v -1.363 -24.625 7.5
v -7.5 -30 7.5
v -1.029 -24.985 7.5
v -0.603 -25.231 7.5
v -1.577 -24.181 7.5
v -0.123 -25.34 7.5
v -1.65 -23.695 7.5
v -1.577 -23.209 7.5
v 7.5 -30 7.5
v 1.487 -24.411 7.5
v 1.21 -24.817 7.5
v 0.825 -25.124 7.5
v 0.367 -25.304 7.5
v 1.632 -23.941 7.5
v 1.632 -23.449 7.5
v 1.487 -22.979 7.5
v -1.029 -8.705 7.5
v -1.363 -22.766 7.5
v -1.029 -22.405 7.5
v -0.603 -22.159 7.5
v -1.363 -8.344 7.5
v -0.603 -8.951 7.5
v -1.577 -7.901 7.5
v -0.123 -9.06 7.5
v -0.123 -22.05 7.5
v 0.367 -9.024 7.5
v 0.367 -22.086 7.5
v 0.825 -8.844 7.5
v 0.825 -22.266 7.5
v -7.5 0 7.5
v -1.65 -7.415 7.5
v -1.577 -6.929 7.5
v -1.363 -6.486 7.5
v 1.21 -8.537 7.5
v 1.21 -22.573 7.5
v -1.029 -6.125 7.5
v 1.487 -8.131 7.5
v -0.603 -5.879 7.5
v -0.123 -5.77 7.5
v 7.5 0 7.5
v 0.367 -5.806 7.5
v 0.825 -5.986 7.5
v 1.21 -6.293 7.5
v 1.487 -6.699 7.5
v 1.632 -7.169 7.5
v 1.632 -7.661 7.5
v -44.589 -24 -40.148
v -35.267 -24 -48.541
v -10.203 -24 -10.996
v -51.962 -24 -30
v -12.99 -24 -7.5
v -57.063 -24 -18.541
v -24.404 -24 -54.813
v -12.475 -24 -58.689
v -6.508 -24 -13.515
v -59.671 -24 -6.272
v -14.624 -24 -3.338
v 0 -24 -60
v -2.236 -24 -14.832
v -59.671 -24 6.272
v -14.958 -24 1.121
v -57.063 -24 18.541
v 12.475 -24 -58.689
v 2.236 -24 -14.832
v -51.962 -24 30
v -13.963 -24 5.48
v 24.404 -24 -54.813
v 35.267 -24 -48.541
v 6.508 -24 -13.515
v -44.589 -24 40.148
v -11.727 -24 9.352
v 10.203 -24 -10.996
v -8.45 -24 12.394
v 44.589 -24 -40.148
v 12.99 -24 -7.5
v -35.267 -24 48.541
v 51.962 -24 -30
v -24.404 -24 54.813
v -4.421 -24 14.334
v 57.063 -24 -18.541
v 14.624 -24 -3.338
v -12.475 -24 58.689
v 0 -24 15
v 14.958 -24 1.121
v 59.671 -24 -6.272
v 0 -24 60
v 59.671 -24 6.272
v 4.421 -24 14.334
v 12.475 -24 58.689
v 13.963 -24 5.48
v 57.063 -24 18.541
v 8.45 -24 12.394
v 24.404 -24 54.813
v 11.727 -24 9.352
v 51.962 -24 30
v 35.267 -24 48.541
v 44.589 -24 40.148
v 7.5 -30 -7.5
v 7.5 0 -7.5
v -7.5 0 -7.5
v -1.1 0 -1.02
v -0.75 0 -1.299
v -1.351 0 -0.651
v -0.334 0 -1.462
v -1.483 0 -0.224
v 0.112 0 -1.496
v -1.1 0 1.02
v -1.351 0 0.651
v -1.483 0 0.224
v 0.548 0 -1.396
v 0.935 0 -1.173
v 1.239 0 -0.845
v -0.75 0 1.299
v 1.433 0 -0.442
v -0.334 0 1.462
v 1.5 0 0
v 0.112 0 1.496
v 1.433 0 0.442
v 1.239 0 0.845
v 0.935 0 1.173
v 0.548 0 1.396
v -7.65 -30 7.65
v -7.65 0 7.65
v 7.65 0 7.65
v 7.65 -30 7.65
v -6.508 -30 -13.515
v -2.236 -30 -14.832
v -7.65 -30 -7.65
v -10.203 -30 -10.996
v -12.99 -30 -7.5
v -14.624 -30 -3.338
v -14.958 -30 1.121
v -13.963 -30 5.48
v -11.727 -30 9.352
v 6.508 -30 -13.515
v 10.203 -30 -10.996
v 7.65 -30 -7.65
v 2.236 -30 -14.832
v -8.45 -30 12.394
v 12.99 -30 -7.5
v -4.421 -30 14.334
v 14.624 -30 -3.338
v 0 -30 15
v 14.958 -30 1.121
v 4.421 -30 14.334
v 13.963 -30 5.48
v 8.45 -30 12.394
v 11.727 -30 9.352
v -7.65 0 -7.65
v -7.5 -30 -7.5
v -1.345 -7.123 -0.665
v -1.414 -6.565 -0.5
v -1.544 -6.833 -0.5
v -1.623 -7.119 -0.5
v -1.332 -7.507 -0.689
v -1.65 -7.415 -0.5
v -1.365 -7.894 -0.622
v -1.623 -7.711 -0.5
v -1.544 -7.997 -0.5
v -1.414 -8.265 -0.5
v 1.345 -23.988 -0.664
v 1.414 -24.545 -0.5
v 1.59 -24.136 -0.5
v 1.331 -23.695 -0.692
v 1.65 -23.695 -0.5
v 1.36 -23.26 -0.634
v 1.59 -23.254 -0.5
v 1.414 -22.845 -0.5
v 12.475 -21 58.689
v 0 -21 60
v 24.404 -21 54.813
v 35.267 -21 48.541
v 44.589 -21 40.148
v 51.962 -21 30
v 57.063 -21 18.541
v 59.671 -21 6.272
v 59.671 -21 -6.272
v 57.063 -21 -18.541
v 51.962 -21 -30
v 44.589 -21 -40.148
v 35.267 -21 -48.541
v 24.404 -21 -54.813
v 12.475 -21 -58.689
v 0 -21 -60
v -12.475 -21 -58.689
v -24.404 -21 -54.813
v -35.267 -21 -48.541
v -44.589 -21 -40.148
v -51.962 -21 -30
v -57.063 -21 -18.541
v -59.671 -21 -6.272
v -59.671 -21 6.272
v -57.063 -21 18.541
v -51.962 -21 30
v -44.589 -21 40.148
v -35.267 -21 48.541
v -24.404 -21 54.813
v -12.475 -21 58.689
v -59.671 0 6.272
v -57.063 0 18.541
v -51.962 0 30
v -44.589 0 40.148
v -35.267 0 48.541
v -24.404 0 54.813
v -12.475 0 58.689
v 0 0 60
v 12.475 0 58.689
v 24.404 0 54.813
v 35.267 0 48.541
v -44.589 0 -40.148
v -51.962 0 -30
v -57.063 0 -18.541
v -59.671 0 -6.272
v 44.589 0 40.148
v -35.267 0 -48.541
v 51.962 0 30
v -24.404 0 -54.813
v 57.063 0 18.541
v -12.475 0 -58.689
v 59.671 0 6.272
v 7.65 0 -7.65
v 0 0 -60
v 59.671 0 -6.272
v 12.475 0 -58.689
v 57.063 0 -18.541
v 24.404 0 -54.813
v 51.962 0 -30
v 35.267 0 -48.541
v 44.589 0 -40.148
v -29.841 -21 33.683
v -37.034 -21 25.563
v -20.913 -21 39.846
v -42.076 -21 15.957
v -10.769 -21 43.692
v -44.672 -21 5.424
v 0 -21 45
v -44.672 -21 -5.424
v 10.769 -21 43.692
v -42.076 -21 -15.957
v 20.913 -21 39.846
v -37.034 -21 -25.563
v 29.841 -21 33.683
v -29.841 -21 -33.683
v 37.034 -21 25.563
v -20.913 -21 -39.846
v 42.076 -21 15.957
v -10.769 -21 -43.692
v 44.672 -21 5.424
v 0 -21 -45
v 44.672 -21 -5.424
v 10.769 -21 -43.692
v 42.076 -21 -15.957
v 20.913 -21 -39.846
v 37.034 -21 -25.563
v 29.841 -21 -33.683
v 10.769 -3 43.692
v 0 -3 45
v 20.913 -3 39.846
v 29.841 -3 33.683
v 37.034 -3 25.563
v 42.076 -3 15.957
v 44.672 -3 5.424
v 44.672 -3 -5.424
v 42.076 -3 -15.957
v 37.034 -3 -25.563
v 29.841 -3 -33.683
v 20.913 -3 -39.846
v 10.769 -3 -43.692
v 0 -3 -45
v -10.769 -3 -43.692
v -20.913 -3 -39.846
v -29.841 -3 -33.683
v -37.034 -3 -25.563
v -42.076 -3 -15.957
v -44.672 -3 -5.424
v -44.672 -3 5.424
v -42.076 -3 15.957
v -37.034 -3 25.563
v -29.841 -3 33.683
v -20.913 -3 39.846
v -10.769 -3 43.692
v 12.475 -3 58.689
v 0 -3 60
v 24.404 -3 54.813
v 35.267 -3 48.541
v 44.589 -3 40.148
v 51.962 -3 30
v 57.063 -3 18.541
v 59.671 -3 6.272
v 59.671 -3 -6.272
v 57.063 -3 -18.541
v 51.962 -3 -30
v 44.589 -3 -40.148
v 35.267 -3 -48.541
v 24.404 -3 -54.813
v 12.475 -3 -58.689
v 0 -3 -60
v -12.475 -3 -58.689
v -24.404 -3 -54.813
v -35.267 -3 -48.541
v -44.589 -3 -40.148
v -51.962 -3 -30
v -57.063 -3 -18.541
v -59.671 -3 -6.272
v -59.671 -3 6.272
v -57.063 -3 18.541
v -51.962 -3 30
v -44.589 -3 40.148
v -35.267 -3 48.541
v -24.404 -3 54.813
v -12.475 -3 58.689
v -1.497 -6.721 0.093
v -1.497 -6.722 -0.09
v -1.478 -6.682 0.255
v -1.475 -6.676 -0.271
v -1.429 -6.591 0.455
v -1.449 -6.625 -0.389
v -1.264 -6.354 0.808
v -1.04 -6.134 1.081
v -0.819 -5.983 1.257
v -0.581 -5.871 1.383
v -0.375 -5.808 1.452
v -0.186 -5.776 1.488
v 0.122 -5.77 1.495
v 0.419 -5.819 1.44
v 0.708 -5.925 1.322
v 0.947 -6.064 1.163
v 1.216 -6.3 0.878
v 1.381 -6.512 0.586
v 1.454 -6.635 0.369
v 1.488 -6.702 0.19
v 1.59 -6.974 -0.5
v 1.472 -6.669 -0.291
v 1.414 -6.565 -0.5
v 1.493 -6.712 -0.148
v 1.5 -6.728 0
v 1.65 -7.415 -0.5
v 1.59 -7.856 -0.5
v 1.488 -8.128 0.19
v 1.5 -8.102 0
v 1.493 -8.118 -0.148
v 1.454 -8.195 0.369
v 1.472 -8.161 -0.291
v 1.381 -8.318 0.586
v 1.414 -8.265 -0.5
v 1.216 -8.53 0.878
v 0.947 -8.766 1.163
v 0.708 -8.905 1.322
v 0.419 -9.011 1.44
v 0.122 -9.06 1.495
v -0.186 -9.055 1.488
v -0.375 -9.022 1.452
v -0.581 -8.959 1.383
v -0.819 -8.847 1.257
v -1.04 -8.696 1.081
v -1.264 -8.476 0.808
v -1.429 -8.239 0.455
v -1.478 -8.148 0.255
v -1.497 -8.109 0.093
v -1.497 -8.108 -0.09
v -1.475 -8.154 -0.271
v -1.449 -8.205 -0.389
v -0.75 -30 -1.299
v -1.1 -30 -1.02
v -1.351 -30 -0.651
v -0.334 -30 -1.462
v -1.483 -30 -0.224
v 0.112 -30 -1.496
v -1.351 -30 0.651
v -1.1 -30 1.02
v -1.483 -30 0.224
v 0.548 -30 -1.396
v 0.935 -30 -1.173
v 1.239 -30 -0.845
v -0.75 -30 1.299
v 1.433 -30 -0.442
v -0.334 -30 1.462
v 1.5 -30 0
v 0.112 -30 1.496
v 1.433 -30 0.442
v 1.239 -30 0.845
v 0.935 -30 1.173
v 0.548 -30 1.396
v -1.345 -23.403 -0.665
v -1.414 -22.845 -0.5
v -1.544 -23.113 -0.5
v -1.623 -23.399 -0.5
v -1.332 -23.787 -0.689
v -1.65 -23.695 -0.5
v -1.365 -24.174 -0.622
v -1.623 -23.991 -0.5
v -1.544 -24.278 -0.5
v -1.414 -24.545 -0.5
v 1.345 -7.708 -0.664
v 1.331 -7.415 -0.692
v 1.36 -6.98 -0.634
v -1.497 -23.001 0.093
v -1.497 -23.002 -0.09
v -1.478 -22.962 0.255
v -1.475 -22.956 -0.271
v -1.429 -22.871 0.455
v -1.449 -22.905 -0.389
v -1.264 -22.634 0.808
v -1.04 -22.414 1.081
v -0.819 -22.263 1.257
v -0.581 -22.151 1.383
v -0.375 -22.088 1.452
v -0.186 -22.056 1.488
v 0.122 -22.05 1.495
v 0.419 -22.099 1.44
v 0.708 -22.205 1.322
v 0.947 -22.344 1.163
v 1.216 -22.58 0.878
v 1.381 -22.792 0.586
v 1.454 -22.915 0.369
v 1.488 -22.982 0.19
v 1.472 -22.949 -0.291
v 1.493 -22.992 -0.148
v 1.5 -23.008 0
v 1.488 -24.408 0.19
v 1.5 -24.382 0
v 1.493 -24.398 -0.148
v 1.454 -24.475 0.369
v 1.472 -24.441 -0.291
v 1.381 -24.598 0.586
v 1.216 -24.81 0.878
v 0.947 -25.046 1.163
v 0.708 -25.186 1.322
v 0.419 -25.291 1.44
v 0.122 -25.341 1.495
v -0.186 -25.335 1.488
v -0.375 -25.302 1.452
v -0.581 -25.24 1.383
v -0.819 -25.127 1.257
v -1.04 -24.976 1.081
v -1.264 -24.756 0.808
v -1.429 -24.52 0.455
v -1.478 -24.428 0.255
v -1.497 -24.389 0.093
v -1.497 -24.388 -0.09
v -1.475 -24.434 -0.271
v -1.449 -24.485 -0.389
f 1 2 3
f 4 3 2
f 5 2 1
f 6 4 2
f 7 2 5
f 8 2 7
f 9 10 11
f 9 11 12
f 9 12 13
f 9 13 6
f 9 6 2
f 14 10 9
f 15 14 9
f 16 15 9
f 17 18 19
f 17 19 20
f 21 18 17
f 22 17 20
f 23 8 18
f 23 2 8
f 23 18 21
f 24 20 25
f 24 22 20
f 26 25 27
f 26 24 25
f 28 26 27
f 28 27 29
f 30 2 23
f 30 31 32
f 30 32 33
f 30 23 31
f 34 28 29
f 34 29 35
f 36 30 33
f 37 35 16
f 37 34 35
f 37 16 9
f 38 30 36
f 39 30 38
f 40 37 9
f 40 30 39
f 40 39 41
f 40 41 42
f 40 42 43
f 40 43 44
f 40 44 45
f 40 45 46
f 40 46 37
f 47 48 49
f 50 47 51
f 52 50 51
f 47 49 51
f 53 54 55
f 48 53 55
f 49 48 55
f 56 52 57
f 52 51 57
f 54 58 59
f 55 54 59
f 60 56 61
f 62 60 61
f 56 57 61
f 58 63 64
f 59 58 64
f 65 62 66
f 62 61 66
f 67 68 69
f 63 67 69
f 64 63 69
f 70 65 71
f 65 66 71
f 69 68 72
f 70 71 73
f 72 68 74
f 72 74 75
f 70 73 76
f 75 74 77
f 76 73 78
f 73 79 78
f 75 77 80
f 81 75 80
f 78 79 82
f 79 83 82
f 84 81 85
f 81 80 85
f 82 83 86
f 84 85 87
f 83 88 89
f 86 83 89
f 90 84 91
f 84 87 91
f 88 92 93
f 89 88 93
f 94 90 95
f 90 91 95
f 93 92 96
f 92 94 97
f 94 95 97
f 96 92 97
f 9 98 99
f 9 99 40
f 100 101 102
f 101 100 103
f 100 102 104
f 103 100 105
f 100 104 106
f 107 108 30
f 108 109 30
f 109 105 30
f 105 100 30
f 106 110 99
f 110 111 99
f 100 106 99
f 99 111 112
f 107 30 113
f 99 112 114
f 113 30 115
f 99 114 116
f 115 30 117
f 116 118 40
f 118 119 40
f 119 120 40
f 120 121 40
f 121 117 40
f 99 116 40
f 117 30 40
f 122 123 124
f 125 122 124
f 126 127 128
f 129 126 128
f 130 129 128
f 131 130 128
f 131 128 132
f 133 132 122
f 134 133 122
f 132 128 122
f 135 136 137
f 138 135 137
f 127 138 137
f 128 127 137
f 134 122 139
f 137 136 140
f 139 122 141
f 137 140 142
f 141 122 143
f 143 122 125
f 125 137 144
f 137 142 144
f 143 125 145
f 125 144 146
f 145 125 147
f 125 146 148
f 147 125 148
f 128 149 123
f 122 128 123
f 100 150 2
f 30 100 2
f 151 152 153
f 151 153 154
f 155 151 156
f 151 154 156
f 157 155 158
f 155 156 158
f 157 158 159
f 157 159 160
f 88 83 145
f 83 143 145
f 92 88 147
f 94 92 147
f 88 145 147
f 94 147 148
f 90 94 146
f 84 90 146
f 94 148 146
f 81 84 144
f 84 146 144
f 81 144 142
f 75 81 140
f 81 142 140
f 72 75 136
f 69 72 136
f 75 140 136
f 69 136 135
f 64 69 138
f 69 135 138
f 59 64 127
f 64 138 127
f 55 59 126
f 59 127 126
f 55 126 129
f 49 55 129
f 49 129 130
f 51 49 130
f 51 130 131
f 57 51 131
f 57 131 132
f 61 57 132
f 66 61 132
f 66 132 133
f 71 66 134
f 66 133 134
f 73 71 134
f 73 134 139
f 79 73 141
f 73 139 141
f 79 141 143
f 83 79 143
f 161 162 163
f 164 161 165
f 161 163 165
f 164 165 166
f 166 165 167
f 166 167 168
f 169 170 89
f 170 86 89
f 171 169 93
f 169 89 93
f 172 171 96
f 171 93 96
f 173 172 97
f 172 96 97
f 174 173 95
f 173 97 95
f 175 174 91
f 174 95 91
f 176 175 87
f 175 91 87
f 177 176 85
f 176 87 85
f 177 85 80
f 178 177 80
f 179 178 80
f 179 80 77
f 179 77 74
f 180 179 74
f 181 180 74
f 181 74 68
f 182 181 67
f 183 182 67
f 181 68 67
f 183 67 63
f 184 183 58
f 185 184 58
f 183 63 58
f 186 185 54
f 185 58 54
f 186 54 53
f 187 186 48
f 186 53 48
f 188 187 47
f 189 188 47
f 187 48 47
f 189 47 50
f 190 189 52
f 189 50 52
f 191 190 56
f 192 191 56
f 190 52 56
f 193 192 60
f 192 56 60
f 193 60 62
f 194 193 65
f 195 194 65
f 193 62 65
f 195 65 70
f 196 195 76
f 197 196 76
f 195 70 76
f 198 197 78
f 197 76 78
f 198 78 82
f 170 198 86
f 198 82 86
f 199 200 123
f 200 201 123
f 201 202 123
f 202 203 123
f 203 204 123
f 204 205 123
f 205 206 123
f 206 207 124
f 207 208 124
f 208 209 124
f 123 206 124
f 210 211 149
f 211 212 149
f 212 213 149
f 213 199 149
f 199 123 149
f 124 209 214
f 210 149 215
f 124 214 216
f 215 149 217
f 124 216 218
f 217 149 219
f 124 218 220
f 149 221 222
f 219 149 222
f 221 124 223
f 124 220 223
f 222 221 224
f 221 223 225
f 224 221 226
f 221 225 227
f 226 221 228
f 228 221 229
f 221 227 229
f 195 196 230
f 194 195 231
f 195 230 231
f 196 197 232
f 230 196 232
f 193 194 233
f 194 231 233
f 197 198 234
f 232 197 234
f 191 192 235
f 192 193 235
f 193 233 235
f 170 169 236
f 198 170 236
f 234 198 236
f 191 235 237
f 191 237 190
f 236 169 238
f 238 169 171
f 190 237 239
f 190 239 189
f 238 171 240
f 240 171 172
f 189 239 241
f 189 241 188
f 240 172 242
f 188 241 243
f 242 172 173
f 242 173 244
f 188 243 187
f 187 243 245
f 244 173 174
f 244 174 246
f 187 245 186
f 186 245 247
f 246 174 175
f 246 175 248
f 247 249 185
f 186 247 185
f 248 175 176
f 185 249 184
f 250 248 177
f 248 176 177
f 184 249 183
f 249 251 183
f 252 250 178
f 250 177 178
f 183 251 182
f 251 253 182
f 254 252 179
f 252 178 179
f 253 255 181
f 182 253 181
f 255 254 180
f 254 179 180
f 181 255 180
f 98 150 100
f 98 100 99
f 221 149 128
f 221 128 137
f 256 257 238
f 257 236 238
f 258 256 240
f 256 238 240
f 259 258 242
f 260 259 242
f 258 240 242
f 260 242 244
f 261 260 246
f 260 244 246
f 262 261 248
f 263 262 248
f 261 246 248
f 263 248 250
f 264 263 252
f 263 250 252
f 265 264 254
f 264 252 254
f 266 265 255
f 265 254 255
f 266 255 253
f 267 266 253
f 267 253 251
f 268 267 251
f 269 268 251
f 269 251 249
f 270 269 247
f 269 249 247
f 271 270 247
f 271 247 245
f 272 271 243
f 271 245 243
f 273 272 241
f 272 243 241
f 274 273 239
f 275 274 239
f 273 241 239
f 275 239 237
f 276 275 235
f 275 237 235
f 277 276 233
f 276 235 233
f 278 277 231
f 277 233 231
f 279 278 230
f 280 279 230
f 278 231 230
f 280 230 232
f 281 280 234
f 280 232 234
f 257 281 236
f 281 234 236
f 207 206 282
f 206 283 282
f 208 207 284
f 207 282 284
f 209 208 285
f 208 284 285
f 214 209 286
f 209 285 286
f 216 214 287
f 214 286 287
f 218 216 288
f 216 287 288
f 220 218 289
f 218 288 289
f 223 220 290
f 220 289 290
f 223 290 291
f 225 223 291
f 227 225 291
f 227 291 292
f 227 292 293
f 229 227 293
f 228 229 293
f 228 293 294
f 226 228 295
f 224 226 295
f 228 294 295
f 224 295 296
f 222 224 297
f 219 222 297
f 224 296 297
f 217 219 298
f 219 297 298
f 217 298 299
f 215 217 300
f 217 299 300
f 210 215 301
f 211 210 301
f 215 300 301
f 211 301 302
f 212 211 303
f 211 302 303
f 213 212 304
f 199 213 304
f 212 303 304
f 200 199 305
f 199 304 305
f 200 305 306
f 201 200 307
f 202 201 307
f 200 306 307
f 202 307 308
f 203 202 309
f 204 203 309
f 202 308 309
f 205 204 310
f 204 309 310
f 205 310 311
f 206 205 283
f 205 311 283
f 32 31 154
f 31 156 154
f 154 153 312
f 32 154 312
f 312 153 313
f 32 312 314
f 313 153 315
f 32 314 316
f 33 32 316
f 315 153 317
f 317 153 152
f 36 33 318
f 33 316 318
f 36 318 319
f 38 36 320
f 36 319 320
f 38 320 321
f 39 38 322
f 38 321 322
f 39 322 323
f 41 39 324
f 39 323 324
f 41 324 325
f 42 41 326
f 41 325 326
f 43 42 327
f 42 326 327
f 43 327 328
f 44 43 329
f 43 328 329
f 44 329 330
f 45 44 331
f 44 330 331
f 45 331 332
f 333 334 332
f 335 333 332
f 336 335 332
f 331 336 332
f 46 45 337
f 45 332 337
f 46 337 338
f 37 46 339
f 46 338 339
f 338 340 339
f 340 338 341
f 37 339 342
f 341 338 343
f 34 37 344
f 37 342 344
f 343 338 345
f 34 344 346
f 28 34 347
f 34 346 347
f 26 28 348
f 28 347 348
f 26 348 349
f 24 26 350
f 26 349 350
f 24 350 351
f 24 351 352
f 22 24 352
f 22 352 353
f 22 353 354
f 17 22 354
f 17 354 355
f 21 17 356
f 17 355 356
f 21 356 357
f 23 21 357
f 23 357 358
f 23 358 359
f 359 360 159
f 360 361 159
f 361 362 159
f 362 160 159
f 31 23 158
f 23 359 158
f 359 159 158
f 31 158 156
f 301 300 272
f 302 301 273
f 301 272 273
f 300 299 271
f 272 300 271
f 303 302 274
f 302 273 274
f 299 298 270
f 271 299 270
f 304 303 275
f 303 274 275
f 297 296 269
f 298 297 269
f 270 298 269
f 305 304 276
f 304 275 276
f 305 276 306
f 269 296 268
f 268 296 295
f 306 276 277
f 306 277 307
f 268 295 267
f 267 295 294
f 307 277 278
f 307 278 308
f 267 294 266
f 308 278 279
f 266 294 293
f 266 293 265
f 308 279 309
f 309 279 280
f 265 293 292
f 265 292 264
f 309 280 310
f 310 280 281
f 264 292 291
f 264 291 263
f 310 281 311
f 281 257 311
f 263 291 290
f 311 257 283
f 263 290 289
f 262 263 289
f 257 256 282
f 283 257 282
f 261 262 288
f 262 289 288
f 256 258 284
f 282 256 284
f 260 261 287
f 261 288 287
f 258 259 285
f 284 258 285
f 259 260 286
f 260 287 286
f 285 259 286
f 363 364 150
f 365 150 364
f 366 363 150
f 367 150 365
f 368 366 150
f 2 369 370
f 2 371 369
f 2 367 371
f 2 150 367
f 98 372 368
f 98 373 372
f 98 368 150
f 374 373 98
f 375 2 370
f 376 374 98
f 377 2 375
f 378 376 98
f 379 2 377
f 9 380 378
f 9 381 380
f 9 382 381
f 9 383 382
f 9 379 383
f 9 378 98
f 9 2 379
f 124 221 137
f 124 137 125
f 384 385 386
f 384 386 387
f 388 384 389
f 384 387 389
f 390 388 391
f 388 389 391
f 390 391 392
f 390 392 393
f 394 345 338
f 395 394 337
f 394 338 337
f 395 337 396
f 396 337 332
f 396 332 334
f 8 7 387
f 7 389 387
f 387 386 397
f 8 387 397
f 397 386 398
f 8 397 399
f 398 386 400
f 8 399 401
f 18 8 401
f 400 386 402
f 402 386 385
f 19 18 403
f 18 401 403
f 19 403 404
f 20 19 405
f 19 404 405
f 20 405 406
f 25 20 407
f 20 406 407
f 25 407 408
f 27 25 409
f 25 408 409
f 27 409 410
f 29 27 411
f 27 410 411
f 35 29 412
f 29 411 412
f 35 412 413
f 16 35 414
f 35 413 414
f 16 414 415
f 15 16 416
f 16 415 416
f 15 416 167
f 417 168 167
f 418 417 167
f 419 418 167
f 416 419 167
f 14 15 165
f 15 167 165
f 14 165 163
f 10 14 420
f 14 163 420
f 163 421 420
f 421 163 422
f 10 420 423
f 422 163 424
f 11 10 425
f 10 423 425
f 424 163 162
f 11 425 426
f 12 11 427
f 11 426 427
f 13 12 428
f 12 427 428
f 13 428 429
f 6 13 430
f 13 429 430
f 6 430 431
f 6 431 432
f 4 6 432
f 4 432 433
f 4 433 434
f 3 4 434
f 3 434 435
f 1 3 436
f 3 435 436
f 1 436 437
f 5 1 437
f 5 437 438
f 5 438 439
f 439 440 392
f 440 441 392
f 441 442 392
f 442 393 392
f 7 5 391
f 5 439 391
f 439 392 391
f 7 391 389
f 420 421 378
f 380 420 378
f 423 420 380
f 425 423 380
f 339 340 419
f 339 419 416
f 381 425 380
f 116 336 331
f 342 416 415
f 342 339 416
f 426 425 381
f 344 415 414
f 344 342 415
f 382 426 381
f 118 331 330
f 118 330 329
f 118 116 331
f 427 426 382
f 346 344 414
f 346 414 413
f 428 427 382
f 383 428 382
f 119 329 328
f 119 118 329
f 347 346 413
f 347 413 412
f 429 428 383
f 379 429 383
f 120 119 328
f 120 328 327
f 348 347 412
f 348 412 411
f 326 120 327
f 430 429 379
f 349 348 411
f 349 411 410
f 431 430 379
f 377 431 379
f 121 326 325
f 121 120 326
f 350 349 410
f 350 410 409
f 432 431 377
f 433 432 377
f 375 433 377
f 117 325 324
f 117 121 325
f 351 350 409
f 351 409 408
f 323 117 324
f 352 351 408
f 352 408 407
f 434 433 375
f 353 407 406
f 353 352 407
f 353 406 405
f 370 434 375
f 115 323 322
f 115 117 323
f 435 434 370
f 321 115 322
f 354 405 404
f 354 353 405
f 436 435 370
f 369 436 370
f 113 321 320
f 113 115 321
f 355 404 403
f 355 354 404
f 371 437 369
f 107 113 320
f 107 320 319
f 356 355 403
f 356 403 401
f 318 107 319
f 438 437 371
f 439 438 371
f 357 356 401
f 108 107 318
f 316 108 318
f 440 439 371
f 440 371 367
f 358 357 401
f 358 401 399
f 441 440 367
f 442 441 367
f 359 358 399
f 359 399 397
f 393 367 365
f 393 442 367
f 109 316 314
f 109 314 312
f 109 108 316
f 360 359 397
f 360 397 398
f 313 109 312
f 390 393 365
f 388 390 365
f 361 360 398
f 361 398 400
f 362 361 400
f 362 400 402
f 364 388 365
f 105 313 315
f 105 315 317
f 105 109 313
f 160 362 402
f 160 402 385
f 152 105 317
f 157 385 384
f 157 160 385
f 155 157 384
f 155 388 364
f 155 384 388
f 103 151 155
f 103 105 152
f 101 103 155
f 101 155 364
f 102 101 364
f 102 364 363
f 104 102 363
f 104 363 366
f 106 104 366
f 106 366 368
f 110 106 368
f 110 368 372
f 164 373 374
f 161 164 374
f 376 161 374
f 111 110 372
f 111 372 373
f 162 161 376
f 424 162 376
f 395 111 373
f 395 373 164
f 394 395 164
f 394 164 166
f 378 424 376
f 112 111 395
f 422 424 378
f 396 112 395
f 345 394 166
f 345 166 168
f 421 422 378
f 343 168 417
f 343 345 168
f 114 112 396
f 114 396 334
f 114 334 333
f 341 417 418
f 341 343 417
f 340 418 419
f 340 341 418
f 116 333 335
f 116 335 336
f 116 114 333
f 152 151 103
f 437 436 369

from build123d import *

# Parameters (mm, degrees)
F0_W     = 15
F0_H     = 15
F0_R     = 1.5
F1_DEPTH = 30
F3_D     = 3.3
F3_DEPTH = 8
F3_TIP   = 0.9914200214
F6_W     = 15.3
F6_H     = 15.3
F7_DEPTH = 30.0010001


with BuildPart() as f1:
    # F0 (on Front) → F1 (new body)
    with BuildSketch(Plane.XZ):
        Rectangle(F0_W, F0_H)
        Circle(F0_R, mode=Mode.SUBTRACT)
    extrude(amount=F1_DEPTH)

    # F3
    with Locations(Plane.XY.offset(7.5)):
        with Locations((0, -7.4150050059), (0, -23.6950945109)):
            Hole(F3_D / 2, depth=F3_DEPTH)
            with Locations((0, 0, -(F3_DEPTH + F3_TIP / 2))):  # 118° drill point
                Cone(0, F3_D / 2, F3_TIP, mode=Mode.SUBTRACT)


with BuildPart() as f5:
    # F4 (on Right) → F5 (revolve)
    with BuildSketch(Plane.YZ):
        Polygon((-30, 0), (0, 0), (0, 60), (-3, 60), (-3, 45), (-21, 45), (-21, 60), (-24, 60), (-24, 15), (-30, 15), align=None)
    revolve(axis=Axis((0, -24.8045190237, 0), (0, 1, 0)))

    # F6 (on Front) → F7 (cut, through all)
    with BuildSketch(Plane.XZ):
        Rectangle(F6_W, F6_H)
    extrude(amount=F7_DEPTH, mode=Mode.SUBTRACT)


solid = Compound([f1.part, f5.part])
